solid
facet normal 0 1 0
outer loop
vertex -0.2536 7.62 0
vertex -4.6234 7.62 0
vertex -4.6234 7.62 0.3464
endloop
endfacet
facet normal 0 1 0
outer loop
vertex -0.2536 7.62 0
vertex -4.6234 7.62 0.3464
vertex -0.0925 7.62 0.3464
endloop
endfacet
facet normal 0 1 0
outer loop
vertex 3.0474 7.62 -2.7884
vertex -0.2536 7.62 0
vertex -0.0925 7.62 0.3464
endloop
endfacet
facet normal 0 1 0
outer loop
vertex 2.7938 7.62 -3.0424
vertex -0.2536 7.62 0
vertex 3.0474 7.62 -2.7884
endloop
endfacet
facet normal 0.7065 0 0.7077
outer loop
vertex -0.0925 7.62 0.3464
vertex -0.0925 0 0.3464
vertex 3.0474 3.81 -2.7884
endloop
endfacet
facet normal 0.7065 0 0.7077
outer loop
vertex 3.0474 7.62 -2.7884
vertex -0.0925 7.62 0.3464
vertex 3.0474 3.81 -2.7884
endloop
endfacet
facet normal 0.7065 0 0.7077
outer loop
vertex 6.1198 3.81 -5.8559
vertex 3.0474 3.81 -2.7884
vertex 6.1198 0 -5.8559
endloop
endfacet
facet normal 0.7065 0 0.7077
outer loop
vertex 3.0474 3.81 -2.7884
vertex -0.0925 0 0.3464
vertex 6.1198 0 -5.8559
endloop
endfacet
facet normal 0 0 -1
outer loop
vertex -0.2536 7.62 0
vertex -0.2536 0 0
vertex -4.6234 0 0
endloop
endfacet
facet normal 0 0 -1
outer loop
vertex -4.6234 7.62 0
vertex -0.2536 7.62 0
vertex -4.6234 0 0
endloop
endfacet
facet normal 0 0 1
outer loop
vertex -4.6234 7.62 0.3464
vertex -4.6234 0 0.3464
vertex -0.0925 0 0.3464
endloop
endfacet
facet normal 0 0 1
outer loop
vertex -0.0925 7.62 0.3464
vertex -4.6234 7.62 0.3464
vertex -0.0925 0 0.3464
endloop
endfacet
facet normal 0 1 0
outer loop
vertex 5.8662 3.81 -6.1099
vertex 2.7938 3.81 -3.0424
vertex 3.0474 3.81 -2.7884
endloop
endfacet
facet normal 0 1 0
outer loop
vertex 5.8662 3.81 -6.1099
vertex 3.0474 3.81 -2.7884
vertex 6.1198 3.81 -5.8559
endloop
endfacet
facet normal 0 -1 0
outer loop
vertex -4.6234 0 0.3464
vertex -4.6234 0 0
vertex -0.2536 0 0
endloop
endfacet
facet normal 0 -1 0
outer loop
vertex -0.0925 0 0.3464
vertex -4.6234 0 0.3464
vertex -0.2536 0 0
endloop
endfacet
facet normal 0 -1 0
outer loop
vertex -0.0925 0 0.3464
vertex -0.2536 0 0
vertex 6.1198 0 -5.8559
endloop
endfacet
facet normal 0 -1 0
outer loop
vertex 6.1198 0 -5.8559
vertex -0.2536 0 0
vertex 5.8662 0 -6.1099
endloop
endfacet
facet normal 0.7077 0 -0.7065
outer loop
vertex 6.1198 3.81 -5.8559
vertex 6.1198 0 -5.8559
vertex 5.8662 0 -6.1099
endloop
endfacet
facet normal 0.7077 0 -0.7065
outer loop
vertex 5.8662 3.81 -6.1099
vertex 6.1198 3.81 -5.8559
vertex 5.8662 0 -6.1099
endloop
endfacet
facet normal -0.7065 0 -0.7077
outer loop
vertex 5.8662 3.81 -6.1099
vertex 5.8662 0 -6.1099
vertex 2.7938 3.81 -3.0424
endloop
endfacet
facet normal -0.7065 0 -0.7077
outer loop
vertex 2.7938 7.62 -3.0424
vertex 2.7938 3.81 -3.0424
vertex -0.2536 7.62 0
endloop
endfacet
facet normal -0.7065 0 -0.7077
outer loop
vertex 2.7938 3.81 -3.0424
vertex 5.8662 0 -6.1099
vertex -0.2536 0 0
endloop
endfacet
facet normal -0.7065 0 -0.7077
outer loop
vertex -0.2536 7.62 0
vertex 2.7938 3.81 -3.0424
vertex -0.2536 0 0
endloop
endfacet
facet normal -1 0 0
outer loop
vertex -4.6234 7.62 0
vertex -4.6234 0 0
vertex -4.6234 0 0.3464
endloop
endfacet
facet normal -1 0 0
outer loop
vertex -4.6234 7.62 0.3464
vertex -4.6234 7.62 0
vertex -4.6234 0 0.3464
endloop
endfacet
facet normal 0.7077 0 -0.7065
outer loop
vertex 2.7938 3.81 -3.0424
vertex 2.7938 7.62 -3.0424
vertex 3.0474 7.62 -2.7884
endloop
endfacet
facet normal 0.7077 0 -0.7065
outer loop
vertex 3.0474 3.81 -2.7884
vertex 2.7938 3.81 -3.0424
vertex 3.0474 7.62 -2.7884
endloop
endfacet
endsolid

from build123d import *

# Parameters (mm, degrees)
BOSS_EXTRUDE1_DEPTH = 7.62
CUT_EXTRUDE2_DEPTH  = 3.81


with BuildPart() as part:
    # Sketch1 → Boss-Extrude1 (new body)
    with BuildSketch(Plane(origin=(0, 0, 0), x_dir=(1, 0, 0), z_dir=(0, 1, 0))):
        Polygon((-0.253590848, 0), (-4.623419976, 0), (-4.623419976, -0.346366729), (-0.092515757, -0.346366729), (6.119785938, 5.855927972), (5.86619509, 6.109927972), align=None)
    extrude(amount=BOSS_EXTRUDE1_DEPTH)

    # Sketch3 → Cut-Extrude2 (cut)
    with BuildSketch(Plane(origin=(0, 7.62, 0), x_dir=(1, 0, 0), z_dir=(0, 1, 0))):
        Polygon((6.119785938, 5.855927972), (5.86619509, 6.109927972), (2.793767925, 3.042449981), (3.047358773, 2.788449981), align=None)
    extrude(amount=-CUT_EXTRUDE2_DEPTH, mode=Mode.SUBTRACT)


solid = part.part
